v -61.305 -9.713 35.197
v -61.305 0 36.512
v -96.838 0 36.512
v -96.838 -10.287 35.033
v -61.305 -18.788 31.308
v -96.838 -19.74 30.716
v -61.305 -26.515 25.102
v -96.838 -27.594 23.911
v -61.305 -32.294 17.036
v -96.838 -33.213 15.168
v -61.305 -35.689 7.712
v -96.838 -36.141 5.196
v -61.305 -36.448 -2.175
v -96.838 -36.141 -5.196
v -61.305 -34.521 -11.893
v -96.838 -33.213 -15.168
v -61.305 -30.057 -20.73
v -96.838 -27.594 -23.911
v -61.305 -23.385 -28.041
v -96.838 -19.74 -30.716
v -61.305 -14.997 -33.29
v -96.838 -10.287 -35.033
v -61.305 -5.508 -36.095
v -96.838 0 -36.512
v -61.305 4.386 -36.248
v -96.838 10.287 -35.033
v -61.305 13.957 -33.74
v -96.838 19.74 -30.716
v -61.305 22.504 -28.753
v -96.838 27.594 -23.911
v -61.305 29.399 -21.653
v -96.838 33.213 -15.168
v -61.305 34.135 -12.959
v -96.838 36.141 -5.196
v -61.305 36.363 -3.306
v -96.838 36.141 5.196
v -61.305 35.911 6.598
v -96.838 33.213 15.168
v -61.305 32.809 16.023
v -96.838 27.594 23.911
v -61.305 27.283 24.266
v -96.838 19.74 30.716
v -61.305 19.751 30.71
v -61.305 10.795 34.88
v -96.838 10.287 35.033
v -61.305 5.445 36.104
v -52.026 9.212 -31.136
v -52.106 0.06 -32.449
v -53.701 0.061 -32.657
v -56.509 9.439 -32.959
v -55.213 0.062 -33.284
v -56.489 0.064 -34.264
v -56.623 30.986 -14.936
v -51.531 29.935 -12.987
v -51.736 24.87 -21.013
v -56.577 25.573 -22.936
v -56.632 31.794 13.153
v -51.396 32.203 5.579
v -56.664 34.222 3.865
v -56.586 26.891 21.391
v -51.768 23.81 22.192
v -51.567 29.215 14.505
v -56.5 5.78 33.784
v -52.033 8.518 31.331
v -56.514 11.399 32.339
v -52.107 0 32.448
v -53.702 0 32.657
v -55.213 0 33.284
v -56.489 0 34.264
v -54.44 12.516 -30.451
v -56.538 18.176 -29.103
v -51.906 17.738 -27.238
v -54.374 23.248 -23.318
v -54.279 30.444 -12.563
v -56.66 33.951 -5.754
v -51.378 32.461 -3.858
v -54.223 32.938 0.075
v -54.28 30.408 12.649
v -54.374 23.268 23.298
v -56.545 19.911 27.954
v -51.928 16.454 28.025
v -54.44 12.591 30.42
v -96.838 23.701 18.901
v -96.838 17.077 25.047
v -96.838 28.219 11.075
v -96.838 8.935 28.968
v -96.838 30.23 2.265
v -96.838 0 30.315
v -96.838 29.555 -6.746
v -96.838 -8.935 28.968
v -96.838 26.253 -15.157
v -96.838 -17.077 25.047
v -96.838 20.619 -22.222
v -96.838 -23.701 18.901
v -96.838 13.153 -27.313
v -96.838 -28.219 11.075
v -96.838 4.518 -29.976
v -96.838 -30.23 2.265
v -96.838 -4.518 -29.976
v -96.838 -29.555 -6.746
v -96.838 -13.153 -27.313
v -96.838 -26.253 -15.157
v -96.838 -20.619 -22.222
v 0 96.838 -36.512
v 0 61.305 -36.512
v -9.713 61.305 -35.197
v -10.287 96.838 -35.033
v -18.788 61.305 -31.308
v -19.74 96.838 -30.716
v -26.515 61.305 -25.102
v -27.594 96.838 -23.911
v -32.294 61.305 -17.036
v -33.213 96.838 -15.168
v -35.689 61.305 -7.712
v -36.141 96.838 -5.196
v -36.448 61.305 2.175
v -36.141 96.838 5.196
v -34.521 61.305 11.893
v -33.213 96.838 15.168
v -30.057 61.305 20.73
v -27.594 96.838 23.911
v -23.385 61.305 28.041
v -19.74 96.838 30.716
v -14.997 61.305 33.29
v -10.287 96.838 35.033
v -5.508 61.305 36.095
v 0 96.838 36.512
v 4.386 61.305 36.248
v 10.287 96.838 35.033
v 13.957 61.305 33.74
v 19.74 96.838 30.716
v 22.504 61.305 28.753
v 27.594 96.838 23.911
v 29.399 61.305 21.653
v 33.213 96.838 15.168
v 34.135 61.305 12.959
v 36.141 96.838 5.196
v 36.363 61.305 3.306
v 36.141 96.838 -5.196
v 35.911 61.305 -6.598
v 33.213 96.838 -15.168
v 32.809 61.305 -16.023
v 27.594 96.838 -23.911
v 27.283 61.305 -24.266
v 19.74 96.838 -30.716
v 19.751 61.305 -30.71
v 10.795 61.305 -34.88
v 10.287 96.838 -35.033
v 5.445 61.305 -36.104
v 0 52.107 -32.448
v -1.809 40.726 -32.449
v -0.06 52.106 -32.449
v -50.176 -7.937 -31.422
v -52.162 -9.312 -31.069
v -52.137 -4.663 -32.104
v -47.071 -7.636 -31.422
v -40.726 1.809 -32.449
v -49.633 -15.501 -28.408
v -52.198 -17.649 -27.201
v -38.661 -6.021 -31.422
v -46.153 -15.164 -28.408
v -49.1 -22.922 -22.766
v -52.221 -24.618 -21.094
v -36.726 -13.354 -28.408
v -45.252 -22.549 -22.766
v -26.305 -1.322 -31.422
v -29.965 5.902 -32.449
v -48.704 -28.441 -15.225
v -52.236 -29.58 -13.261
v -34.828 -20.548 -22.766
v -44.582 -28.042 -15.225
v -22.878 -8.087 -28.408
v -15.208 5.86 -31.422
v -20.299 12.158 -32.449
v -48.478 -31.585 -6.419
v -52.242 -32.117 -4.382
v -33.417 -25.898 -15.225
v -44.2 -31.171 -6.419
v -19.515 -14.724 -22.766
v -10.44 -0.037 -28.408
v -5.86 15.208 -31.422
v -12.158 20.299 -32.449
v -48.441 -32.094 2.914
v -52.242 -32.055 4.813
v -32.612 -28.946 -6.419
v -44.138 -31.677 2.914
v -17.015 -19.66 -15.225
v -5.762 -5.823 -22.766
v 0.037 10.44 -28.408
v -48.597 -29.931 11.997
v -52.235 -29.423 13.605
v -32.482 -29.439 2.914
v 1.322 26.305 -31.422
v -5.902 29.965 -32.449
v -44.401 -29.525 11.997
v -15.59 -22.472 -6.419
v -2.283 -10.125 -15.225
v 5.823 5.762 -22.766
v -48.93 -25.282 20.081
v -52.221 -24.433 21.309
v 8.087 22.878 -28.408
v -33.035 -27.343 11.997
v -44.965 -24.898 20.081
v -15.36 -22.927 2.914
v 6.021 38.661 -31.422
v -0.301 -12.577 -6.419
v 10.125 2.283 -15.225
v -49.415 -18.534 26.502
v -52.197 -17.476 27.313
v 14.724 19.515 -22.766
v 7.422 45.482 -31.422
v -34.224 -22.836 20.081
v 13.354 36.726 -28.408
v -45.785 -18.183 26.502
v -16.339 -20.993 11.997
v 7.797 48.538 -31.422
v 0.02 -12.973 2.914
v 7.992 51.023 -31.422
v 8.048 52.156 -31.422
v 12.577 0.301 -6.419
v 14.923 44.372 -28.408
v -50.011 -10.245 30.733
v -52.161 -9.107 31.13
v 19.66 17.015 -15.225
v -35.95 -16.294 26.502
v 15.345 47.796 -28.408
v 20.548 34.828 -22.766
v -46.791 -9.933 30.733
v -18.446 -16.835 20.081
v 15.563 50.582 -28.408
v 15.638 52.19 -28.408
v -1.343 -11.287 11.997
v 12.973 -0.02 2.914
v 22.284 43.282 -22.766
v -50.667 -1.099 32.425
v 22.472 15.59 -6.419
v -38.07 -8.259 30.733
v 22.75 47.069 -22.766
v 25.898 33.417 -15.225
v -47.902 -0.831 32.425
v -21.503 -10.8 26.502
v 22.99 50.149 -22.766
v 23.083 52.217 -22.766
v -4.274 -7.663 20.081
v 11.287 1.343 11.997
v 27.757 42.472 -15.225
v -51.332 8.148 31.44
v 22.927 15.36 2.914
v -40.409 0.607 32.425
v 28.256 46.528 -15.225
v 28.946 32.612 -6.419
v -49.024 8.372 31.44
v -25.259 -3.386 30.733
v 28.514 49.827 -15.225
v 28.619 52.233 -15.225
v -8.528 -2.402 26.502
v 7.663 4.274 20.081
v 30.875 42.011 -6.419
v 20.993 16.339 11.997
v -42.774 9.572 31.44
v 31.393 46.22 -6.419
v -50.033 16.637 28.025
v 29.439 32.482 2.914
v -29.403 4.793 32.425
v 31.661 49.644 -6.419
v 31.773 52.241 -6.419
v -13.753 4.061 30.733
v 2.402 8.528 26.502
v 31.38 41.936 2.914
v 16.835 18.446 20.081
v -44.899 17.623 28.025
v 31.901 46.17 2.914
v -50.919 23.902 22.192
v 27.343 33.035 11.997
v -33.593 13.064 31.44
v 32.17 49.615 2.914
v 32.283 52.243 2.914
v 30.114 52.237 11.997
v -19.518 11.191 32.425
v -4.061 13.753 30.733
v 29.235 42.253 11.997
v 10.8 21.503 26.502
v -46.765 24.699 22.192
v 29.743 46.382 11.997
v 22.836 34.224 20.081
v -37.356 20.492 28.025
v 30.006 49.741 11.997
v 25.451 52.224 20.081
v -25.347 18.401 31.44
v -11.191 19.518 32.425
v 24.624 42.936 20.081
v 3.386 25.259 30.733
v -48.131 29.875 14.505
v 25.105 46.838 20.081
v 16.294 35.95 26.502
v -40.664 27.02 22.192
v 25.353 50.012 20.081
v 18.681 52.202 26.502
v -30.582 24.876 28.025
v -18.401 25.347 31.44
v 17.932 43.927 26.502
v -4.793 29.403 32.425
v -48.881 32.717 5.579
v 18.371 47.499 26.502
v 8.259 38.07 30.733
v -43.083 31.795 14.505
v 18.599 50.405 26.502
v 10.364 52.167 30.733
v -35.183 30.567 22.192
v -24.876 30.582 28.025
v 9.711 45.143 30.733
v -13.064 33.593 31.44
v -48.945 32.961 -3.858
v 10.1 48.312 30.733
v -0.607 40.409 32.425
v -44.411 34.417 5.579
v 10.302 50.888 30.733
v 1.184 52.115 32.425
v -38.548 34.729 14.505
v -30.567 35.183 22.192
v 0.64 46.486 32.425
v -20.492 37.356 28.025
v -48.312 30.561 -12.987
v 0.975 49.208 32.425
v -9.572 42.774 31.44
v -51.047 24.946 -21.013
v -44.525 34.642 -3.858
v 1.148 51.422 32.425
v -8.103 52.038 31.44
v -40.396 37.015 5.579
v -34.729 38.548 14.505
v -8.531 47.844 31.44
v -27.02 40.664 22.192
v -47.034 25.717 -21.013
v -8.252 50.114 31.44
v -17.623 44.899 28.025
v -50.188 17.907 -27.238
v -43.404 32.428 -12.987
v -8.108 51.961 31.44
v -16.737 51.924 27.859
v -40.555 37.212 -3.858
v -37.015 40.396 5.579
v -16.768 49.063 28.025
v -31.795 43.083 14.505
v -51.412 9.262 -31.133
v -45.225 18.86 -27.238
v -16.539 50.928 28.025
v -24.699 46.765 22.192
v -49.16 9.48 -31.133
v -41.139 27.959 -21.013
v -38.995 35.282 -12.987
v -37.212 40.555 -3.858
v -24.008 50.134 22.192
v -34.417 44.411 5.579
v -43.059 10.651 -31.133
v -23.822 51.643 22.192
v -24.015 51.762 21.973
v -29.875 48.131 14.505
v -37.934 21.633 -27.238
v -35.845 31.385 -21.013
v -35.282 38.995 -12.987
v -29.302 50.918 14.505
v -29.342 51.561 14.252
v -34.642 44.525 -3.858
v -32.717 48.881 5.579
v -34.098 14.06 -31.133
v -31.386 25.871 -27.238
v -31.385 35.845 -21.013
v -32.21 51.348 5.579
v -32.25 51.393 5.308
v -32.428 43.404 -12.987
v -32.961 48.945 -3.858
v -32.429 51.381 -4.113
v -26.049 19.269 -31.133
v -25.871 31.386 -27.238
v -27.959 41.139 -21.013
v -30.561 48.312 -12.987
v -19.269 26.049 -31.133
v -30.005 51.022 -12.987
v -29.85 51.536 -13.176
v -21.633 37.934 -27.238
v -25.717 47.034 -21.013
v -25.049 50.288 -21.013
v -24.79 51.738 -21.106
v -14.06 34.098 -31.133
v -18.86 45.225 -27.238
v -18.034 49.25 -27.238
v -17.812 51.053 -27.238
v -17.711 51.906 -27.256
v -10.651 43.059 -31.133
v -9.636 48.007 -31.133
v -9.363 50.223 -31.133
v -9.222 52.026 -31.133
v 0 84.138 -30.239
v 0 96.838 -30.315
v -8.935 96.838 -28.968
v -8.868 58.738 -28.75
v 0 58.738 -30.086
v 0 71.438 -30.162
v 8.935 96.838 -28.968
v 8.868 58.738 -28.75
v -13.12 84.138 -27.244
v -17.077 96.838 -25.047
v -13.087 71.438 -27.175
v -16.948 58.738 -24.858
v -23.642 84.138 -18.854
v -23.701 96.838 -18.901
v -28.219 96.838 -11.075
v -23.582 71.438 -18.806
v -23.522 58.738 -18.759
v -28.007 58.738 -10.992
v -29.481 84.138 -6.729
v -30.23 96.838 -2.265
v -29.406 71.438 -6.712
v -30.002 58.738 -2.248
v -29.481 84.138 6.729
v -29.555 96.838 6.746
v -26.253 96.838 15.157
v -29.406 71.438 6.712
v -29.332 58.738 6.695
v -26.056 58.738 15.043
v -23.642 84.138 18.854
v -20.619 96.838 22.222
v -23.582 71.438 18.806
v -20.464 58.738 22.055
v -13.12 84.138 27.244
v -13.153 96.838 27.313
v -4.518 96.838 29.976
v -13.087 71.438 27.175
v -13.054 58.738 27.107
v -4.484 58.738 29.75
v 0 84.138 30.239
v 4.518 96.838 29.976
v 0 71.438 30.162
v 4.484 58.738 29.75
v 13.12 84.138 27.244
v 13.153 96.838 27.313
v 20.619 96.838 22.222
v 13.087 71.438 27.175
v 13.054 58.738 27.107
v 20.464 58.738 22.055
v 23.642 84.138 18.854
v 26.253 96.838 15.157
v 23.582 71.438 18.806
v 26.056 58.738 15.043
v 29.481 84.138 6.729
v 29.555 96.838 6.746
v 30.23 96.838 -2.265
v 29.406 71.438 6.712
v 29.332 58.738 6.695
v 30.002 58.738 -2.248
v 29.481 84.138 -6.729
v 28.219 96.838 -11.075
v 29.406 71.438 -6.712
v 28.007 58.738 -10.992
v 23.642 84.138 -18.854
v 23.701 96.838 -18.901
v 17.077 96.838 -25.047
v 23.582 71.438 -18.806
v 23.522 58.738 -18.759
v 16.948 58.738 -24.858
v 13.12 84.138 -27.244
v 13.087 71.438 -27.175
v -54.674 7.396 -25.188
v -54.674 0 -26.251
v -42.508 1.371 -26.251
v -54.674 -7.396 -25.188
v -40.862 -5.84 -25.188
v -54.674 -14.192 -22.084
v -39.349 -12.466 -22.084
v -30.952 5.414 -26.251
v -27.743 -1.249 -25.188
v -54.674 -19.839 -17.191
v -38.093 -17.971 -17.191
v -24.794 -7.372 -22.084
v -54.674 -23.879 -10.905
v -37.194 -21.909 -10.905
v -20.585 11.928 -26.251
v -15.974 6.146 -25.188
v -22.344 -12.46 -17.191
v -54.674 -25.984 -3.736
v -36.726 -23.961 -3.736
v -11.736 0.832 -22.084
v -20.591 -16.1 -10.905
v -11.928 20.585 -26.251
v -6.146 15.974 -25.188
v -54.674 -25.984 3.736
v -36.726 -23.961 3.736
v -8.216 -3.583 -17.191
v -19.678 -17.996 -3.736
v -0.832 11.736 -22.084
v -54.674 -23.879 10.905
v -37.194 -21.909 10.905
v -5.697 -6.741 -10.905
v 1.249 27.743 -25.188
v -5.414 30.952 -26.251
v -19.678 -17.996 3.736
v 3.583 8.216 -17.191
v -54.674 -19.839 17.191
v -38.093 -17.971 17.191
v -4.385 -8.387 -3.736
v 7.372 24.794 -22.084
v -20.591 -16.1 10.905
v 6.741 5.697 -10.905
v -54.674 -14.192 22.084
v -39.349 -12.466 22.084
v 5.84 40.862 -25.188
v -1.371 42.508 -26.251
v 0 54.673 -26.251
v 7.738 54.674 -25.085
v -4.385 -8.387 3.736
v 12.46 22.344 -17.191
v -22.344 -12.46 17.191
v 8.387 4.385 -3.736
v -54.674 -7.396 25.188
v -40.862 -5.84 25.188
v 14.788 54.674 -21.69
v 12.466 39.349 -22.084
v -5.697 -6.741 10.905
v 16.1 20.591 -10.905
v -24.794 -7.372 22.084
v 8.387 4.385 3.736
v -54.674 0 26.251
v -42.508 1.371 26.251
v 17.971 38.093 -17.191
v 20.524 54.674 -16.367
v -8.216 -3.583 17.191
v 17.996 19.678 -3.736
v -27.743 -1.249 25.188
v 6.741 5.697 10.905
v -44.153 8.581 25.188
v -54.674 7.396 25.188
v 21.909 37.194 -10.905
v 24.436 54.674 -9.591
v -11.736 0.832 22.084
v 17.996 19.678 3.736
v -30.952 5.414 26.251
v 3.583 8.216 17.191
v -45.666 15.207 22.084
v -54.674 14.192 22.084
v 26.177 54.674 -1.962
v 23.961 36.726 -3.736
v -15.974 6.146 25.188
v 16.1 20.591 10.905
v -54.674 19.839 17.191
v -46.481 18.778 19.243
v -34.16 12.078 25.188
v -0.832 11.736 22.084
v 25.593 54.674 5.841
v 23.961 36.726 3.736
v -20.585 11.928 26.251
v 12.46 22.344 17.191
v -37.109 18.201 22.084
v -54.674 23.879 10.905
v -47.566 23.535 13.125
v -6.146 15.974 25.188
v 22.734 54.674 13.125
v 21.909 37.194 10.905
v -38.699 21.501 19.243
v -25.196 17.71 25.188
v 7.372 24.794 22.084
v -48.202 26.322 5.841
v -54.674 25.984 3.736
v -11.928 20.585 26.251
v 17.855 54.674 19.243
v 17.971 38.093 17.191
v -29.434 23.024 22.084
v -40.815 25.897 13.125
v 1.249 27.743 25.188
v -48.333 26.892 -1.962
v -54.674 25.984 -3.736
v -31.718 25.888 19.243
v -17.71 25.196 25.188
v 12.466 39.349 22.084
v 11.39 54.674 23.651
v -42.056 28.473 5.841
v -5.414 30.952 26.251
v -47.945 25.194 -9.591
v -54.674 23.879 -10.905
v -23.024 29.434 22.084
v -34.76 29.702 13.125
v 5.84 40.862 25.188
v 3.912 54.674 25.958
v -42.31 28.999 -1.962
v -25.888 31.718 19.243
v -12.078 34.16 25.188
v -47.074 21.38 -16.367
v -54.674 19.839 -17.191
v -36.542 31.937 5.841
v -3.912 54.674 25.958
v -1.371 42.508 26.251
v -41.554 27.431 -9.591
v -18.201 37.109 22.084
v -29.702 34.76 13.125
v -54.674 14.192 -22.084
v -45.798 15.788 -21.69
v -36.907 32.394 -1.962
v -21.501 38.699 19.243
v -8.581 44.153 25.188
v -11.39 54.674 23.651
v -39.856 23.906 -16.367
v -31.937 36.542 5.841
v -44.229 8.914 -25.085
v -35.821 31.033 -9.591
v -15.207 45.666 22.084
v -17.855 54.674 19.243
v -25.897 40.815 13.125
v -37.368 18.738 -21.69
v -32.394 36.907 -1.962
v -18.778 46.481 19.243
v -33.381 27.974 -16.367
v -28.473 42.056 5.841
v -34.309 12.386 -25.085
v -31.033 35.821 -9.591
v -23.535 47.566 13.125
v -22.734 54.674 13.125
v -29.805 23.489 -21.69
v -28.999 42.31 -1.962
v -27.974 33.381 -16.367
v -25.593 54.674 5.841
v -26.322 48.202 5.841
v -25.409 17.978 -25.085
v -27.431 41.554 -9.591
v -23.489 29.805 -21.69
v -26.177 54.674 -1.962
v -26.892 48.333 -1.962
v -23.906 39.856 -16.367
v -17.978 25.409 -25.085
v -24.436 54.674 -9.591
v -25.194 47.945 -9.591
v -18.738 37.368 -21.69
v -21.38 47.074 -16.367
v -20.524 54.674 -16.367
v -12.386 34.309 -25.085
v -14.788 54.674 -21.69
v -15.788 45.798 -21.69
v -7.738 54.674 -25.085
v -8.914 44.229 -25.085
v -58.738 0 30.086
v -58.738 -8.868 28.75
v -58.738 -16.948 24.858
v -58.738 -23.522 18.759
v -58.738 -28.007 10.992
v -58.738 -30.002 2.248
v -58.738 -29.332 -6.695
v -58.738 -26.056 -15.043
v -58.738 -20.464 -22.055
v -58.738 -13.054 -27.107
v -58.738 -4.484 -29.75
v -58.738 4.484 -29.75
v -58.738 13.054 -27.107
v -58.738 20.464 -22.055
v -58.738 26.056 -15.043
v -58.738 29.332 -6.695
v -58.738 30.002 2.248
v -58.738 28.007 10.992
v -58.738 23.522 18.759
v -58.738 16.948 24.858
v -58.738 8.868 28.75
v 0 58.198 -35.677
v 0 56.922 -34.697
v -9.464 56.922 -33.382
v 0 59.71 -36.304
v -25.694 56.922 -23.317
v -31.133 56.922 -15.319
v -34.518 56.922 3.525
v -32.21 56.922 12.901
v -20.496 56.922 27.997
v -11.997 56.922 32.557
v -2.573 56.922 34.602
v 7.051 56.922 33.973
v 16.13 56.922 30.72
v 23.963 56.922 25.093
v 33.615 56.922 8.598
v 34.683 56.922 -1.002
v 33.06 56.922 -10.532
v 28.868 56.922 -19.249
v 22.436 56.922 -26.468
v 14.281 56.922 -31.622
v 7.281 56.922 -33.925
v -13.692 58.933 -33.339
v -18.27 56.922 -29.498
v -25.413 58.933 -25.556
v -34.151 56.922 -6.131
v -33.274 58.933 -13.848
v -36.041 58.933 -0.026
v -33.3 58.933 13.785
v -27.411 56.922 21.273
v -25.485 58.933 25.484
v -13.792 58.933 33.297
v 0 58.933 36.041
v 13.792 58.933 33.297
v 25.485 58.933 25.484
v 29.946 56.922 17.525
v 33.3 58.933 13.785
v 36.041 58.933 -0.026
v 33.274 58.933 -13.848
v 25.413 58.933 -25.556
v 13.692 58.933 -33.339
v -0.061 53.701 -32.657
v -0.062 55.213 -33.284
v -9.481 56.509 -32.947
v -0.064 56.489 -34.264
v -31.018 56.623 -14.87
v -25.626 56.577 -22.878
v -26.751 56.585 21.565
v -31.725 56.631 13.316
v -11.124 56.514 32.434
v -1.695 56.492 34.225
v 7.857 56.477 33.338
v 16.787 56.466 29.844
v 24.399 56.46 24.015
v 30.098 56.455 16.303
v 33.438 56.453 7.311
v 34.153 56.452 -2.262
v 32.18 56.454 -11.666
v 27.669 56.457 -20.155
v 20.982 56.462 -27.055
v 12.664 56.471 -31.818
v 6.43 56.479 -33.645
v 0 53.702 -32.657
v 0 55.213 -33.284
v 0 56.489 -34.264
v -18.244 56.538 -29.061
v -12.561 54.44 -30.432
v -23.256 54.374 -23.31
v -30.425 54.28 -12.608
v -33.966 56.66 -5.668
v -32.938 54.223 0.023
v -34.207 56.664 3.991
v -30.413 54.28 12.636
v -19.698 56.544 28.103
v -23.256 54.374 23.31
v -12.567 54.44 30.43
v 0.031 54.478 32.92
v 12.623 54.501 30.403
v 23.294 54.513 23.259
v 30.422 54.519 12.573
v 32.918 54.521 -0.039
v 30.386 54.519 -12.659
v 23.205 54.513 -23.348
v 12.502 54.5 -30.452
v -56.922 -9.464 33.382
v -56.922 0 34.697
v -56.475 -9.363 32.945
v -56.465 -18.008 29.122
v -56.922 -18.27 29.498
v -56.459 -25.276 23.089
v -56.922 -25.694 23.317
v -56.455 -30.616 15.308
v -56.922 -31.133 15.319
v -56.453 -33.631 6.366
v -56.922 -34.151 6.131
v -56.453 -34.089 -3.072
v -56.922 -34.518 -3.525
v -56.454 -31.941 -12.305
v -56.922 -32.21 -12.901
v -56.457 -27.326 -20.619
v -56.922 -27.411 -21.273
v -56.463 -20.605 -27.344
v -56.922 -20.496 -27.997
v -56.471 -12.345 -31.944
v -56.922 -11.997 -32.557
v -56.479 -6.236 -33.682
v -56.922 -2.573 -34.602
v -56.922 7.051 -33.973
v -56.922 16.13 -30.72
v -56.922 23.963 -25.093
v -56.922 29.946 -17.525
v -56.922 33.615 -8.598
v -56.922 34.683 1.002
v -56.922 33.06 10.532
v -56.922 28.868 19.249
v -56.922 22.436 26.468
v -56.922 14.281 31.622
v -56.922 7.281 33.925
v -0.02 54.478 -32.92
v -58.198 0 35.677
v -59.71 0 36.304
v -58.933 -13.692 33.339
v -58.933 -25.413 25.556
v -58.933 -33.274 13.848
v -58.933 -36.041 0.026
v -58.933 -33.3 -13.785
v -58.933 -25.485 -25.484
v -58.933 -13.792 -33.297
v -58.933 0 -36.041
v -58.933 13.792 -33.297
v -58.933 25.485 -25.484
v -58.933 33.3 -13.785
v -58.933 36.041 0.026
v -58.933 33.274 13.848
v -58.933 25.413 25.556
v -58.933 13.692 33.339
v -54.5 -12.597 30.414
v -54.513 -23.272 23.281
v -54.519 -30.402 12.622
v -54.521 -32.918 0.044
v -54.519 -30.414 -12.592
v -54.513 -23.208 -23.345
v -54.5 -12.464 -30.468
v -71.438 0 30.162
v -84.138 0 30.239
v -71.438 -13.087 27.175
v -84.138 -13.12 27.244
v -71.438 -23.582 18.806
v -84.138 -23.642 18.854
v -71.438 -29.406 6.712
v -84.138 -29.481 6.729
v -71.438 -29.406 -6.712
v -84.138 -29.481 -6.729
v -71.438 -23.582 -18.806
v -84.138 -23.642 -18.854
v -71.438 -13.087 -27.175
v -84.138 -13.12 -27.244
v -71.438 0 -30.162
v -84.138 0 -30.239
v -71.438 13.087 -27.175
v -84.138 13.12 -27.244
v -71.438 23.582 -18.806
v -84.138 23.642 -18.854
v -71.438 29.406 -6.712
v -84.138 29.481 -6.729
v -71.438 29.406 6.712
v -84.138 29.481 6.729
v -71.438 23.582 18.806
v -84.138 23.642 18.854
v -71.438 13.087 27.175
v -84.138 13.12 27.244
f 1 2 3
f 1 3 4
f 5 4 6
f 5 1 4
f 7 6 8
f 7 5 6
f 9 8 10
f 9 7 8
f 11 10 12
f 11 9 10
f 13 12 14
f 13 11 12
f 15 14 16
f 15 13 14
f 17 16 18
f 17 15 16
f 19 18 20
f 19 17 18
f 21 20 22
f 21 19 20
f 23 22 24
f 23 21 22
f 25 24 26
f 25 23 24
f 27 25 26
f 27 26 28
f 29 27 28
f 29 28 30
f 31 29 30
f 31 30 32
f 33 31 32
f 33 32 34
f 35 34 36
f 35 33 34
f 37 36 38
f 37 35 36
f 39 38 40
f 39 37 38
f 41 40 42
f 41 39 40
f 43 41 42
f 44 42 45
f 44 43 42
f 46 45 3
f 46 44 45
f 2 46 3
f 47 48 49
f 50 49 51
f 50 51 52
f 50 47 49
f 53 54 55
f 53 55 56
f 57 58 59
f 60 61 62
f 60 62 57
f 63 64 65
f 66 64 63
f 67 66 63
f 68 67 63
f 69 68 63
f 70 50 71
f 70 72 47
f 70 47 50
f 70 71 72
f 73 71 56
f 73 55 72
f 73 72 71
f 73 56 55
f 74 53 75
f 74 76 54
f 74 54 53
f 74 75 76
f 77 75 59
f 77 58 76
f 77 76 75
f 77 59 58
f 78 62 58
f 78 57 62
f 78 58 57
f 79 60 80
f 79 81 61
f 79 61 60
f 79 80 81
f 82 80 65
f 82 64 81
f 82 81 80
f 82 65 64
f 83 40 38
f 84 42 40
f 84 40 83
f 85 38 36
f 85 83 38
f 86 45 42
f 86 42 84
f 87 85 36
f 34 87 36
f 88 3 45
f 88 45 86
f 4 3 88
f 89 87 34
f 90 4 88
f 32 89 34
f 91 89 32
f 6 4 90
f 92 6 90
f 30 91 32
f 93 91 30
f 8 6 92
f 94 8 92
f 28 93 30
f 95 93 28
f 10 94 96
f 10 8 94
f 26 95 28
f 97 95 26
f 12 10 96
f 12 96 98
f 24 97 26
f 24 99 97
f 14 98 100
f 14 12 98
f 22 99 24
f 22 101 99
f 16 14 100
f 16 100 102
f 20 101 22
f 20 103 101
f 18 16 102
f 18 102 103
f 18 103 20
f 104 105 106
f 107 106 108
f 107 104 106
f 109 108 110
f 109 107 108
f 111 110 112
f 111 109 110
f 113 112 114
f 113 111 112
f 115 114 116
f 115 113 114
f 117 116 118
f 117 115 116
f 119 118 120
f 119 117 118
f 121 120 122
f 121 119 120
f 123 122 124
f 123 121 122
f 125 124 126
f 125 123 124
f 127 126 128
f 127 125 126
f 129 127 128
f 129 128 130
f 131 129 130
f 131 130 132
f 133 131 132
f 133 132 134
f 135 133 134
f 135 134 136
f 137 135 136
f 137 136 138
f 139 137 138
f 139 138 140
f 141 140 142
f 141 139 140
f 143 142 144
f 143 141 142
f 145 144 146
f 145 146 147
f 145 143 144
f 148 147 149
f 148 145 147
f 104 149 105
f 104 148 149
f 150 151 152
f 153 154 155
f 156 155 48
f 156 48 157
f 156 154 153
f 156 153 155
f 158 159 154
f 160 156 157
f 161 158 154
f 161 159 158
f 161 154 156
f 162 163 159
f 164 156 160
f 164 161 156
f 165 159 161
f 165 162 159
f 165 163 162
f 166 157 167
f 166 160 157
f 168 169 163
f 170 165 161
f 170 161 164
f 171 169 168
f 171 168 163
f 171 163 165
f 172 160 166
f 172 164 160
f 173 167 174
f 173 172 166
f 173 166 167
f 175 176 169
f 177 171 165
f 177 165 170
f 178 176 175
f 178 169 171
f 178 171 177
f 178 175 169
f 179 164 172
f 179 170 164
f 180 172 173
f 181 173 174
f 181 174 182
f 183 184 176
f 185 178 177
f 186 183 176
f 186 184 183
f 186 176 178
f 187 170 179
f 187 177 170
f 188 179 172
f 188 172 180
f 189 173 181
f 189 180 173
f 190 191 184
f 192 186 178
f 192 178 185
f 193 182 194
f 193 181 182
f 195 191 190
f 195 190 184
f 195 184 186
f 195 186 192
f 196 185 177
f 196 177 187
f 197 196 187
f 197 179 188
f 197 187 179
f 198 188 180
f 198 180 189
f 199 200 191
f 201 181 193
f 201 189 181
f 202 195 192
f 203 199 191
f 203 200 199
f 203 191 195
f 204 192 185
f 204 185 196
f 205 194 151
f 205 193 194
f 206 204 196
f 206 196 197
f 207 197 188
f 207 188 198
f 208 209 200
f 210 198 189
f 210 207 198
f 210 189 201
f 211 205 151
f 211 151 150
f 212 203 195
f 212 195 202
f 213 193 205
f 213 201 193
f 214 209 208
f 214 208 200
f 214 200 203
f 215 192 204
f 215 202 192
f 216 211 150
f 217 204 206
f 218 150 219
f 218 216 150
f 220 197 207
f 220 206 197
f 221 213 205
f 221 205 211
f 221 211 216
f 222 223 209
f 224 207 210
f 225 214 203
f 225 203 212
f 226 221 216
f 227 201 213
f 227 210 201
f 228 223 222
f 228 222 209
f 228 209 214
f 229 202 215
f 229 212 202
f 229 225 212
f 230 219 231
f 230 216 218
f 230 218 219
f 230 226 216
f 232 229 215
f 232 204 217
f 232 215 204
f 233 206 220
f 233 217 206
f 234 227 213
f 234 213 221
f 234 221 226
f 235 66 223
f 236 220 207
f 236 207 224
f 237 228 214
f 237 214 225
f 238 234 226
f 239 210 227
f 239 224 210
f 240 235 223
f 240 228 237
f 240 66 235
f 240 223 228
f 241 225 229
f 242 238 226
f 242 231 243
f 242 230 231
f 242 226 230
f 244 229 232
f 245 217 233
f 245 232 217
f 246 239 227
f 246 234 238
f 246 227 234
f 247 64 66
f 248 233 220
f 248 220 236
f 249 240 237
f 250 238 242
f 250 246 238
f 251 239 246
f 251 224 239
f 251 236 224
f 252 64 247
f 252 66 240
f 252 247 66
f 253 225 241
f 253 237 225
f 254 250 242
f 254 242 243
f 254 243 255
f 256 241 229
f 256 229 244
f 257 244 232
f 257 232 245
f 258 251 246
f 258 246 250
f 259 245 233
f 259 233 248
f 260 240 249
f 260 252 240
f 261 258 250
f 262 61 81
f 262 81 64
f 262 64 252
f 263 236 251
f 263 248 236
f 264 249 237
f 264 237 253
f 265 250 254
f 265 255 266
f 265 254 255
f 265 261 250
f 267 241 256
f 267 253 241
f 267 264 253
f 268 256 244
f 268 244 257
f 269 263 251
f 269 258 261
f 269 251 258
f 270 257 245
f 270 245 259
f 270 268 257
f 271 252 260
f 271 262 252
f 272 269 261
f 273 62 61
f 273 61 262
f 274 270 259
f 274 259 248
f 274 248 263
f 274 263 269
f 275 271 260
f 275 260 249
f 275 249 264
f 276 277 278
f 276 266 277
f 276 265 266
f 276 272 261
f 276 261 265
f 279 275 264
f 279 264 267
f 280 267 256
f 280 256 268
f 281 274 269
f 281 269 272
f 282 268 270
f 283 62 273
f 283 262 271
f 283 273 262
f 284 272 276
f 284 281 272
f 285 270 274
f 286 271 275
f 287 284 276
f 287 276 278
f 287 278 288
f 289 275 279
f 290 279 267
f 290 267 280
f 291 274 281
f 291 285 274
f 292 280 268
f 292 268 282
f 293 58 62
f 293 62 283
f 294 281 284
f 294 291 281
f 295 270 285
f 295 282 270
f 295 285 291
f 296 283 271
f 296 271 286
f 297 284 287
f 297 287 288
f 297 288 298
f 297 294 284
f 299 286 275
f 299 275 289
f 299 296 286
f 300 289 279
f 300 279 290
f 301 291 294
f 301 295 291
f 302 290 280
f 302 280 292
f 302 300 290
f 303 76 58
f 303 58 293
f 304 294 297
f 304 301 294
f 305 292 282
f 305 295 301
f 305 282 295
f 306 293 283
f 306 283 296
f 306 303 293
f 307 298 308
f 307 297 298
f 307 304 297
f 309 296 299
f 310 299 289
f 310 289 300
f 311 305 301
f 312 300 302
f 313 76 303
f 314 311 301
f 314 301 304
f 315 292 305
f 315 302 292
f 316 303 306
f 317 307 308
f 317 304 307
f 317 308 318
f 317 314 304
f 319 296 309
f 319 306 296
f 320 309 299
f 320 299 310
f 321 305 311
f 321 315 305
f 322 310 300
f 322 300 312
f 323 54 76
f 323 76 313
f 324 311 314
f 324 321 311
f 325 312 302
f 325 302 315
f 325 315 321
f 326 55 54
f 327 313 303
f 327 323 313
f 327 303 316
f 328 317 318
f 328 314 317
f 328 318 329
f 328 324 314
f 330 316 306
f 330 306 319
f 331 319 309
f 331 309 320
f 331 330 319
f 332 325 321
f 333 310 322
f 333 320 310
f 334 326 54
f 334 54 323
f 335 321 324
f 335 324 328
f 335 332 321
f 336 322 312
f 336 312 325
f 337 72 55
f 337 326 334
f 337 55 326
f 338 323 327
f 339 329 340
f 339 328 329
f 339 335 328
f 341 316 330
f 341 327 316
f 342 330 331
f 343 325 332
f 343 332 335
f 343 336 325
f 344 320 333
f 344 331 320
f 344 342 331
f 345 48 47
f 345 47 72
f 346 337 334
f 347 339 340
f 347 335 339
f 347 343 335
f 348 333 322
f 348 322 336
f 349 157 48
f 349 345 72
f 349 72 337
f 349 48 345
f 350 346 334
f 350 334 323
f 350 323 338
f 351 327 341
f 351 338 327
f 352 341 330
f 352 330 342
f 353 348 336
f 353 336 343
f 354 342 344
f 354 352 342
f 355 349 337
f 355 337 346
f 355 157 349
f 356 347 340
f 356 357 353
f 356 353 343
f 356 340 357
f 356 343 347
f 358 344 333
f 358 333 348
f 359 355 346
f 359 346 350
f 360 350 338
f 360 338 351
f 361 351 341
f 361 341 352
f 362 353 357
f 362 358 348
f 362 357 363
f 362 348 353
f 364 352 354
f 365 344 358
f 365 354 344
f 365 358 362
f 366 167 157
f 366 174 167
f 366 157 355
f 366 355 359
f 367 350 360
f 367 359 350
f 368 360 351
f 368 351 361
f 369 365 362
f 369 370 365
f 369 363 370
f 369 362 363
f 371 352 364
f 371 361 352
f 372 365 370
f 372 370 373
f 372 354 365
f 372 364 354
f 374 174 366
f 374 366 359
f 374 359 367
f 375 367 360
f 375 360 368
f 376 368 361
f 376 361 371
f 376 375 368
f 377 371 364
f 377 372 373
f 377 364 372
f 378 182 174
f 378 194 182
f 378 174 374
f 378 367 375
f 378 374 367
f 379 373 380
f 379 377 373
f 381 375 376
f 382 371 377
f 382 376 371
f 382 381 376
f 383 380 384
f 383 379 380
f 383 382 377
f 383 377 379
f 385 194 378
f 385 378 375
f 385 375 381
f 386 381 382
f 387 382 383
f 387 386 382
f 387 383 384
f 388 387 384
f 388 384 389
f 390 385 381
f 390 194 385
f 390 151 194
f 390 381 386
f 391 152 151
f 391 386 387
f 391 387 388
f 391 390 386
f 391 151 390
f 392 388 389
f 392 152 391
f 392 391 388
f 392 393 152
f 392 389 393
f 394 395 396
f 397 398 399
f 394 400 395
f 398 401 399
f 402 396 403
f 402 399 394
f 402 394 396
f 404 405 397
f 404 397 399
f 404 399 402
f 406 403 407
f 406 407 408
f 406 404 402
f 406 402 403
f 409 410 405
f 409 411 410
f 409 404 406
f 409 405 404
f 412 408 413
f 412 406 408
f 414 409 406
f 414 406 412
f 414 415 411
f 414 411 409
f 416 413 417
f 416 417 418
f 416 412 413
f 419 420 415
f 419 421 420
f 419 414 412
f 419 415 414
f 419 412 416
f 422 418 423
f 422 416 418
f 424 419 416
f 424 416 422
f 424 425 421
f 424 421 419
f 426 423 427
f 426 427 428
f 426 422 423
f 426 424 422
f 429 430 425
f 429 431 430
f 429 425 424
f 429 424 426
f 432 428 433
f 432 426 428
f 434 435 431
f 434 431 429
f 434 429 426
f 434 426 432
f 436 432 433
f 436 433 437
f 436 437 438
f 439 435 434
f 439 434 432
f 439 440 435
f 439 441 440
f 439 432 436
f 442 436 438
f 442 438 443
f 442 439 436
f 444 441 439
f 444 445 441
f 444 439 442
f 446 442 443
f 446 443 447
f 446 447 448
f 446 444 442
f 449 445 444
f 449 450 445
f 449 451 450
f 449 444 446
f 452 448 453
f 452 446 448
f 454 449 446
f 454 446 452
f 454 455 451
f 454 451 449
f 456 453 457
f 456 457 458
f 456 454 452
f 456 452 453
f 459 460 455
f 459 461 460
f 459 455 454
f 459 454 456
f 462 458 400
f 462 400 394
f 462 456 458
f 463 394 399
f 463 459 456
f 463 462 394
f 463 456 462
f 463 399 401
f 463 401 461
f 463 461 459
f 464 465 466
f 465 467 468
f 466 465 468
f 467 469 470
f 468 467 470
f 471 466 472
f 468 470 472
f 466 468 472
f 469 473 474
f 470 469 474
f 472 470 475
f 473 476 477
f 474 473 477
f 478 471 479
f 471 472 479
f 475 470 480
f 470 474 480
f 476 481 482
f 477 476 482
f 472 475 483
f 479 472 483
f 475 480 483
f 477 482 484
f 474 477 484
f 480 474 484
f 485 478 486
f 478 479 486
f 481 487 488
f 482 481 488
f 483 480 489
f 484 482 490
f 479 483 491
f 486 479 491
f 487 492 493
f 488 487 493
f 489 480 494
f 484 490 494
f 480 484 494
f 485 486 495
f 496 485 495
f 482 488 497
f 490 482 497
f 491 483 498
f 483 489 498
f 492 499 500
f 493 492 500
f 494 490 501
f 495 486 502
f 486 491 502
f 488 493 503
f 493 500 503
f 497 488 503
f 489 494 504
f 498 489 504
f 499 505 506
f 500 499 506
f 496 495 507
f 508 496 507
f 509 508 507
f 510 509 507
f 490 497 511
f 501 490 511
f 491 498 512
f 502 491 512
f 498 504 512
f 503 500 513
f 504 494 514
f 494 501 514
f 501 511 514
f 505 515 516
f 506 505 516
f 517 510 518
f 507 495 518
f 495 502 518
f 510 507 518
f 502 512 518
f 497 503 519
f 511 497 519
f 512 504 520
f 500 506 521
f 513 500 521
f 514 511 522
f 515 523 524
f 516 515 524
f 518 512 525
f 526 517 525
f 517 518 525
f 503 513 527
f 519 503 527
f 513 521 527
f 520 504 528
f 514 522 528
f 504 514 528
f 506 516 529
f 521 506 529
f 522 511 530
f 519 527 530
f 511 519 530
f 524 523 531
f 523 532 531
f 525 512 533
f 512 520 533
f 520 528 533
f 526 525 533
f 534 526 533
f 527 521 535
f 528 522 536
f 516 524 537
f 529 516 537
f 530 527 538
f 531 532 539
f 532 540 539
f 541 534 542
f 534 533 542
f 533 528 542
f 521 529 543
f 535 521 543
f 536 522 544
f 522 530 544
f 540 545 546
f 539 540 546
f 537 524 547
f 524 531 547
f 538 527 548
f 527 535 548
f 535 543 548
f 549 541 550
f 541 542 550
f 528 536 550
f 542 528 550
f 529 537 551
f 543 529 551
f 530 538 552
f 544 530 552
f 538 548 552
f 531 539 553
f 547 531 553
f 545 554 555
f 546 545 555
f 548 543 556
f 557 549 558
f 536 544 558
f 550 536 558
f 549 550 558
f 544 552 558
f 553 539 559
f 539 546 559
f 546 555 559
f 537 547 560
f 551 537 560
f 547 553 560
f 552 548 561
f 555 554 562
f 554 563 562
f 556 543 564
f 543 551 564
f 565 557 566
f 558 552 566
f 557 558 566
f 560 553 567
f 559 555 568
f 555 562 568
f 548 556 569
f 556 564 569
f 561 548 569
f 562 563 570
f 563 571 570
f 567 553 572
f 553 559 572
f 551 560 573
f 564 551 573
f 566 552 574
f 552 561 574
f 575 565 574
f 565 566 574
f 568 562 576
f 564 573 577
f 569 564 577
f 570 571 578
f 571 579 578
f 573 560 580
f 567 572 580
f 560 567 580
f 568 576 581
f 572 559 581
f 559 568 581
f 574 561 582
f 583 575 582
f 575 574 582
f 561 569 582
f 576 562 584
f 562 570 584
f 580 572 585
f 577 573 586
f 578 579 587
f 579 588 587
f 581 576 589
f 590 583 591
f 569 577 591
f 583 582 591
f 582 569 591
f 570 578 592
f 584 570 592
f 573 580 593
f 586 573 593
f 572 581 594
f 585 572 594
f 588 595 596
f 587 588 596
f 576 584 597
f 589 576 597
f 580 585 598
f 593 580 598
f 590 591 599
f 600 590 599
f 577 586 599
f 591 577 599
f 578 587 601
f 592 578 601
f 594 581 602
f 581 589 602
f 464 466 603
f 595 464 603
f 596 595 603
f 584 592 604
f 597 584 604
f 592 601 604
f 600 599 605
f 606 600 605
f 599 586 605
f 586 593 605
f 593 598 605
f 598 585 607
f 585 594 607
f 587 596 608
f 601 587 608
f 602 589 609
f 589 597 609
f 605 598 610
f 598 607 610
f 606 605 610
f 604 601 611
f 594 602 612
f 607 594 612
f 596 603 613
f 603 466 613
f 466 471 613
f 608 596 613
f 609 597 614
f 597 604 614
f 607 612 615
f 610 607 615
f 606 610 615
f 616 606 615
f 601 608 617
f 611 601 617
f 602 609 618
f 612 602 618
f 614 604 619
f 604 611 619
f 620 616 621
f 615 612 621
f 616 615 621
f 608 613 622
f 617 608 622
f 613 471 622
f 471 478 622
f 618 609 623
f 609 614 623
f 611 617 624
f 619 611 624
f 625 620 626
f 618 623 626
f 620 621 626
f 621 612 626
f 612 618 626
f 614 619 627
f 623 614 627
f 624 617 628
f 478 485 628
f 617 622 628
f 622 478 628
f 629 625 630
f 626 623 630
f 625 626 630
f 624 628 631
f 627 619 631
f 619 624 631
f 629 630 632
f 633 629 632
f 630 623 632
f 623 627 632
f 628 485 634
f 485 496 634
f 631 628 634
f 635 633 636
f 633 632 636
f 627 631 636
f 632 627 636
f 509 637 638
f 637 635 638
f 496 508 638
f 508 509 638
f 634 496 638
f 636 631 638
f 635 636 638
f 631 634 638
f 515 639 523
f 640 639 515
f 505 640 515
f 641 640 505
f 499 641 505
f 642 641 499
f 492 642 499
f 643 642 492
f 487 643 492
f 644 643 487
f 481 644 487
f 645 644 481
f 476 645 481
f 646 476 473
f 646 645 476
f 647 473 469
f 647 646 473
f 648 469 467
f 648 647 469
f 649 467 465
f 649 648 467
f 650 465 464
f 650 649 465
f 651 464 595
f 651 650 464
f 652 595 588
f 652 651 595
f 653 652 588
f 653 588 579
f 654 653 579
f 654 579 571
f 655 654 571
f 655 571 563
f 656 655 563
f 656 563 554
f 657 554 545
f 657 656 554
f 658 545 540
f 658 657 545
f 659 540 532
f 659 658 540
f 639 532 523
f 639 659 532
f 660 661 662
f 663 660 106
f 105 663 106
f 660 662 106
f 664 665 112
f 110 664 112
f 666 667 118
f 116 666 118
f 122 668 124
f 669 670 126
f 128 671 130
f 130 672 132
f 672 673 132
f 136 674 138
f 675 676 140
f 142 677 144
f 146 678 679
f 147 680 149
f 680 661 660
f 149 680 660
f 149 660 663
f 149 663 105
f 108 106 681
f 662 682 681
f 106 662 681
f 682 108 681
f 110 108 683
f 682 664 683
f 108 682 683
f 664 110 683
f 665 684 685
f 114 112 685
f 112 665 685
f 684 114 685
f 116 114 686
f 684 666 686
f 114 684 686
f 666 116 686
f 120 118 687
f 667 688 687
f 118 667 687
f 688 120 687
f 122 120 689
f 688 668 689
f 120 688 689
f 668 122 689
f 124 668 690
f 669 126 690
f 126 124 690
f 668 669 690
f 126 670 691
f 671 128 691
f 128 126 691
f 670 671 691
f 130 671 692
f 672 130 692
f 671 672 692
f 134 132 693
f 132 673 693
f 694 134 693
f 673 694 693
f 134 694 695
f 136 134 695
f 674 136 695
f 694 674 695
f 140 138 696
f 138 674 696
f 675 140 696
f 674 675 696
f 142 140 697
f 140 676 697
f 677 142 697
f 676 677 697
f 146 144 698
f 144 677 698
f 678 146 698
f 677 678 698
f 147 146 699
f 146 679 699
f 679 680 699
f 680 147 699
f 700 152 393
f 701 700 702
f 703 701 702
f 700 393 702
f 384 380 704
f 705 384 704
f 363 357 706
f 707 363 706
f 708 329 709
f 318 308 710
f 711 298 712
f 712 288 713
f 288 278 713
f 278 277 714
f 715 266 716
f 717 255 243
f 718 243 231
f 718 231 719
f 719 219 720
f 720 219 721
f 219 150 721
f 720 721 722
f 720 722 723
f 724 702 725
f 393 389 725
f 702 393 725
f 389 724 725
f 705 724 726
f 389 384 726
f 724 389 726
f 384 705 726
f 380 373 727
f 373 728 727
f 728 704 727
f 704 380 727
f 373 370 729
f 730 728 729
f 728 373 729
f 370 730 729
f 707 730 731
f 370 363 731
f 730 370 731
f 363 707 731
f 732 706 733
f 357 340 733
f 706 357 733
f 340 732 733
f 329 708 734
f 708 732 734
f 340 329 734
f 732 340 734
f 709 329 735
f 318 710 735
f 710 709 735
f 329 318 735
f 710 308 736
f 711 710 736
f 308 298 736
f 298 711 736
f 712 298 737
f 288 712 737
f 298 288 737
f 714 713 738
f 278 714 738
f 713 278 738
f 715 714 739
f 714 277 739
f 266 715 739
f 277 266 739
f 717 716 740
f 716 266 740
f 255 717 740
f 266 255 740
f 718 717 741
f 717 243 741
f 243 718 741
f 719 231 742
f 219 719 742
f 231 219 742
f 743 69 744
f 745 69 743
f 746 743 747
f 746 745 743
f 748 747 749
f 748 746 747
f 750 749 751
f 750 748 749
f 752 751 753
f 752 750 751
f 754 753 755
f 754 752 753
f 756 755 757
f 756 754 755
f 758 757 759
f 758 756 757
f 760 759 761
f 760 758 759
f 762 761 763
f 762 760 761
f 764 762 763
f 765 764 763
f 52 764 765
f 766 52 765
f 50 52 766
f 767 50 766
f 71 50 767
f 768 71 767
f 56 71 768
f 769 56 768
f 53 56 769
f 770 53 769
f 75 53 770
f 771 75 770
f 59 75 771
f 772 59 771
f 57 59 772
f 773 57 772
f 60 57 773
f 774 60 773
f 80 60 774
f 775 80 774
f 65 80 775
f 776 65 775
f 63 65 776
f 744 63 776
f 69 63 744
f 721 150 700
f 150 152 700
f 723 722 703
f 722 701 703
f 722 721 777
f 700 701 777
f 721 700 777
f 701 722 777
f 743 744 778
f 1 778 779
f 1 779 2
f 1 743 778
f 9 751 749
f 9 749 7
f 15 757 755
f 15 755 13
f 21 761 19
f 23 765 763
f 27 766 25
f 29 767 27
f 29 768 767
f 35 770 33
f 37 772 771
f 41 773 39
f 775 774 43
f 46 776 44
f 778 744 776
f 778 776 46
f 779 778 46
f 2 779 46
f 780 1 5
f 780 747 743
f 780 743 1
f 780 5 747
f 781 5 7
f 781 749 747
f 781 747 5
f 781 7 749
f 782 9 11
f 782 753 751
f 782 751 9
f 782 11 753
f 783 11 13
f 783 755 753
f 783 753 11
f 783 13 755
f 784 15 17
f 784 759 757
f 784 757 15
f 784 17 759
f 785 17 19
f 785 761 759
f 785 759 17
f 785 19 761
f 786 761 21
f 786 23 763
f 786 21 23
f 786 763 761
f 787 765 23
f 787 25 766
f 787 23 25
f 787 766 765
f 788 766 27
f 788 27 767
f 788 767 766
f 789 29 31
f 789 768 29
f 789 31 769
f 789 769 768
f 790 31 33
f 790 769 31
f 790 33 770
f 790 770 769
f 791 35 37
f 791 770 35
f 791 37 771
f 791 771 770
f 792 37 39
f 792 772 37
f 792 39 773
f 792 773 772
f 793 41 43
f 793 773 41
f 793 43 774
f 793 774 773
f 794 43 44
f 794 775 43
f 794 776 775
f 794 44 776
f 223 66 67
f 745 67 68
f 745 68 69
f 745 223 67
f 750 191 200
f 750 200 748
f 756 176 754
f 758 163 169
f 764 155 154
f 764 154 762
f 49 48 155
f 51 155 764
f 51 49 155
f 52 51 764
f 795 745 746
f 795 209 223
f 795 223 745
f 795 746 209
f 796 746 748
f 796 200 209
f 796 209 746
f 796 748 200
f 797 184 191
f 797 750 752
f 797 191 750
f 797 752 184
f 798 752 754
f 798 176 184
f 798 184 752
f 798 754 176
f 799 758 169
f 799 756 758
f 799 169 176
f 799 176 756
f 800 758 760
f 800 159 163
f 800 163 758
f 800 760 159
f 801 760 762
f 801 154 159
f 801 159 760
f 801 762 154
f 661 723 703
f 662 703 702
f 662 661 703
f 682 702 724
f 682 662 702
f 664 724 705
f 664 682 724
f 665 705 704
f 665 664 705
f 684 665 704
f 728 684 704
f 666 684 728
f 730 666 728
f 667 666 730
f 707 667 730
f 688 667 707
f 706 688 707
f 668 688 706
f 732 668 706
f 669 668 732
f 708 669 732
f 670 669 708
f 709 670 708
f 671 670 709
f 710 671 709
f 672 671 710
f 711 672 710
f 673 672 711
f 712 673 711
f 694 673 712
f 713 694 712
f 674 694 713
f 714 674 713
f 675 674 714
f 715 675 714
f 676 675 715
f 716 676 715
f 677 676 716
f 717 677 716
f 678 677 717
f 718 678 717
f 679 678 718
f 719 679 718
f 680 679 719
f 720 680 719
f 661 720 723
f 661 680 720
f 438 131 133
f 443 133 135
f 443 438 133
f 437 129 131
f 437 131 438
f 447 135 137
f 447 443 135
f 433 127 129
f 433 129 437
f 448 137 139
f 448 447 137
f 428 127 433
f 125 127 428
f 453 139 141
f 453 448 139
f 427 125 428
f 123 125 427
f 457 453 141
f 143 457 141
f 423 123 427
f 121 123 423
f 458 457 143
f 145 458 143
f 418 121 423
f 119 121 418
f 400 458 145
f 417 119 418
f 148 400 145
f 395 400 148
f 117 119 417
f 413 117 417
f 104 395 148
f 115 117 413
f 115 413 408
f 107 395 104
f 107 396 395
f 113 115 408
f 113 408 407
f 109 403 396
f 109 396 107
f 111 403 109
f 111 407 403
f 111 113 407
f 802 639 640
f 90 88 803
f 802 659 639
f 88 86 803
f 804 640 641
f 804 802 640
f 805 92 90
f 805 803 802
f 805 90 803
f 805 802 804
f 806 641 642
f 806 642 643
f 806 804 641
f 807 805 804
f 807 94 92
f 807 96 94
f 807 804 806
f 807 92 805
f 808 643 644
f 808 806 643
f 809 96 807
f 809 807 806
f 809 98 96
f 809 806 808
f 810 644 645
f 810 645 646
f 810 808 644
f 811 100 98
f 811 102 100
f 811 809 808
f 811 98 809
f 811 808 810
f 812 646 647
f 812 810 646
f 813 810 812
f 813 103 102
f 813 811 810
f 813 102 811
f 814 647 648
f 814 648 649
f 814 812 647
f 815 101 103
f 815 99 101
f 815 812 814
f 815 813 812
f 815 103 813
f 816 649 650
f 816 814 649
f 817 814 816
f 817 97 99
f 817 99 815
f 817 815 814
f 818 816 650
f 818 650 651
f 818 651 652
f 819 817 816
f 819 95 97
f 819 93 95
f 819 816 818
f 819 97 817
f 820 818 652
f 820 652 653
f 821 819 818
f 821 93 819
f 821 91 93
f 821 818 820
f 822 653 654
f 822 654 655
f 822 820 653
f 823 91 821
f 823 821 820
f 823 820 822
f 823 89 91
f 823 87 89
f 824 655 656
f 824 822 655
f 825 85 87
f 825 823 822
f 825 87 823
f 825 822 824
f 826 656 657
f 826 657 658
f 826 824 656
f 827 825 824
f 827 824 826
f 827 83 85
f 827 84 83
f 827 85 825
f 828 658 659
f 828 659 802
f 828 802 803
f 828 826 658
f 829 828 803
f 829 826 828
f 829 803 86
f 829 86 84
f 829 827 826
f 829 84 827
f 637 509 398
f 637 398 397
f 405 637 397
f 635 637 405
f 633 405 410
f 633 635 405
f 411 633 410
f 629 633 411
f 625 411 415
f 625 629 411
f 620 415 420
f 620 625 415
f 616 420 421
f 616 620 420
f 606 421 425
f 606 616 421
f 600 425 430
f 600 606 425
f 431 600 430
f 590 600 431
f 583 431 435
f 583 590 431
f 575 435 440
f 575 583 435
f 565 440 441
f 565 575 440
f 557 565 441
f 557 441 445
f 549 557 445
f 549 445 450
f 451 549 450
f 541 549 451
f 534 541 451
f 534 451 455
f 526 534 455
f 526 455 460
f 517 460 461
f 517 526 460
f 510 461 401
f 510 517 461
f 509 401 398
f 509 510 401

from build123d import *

# Parameters (mm, degrees)
SKETCH3_R   = 32.4485
SKETCH3_R_2 = 26.2509
FILLET1_R   = 6.1976


with BuildPart() as part:
    # Sketch1 → Revolve1 (revolve)
    with BuildSketch(Plane.XY, mode=Mode.PRIVATE) as revolve1_sk:
        Polygon((-58.7375, -36.5125), (-54.6735, -32.4485), (-54.6735, -26.2509), (-58.7375, -30.0863), (-96.8375, -30.3149), (-96.8375, -36.5125), align=None)
    revolve(revolve1_sk.sketch.rotate(Axis((-96.8375, 0, 0), (1, 0, 0)), 270), axis=Axis((-96.8375, 0, 0), (1, 0, 0)))



with BuildPart() as body_2:
    # Sketch2 → Revolve2 (revolve)
    with BuildSketch(Plane.XY, mode=Mode.PRIVATE) as revolve2_sk:
        Polygon((30.3149, 96.8375), (30.0863, 58.7375), (26.2509, 54.6735), (32.4485, 54.6735), (36.5125, 58.7375), (36.5125, 96.8375), align=None)
    revolve(revolve2_sk.sketch.rotate(Axis((0, 0, 0), (0, 1, 0)), 90), axis=Axis((0, 0, 0), (0, 1, 0)))


with BuildPart() as part_1:
    add(part.part)

    add(body_2.part)  # Sweep1 merges body 2
    # Sweep1: sweep along a path in Sketch4
    with BuildLine(Plane.XY) as sweep1_path:
        ThreePointArc((-54.6735, 0), (-16.013497399, 16.013497399), (0, 54.6735))
    # Sketch3 → Sweep1 (sweep)
    with BuildSketch(Plane(origin=(-54.6735, 0, 0), x_dir=(0, 0, -1), z_dir=(1, 0, 0))):
        Circle(SKETCH3_R)
        Circle(SKETCH3_R_2, mode=Mode.SUBTRACT)
    sweep(path=sweep1_path.line)

    # Fillet1
    fillet1_edges = [part_1.edges().sort_by_distance(p)[0] for p in [
        (-54.6735, -32.4485, 0),
        (0, 54.6735, 32.4485),
        (0, 58.7375, 36.5125),
        (-58.7375, 0, -36.5125),
    ]]
    fillet(fillet1_edges, radius=FILLET1_R)


solid = part_1.part
